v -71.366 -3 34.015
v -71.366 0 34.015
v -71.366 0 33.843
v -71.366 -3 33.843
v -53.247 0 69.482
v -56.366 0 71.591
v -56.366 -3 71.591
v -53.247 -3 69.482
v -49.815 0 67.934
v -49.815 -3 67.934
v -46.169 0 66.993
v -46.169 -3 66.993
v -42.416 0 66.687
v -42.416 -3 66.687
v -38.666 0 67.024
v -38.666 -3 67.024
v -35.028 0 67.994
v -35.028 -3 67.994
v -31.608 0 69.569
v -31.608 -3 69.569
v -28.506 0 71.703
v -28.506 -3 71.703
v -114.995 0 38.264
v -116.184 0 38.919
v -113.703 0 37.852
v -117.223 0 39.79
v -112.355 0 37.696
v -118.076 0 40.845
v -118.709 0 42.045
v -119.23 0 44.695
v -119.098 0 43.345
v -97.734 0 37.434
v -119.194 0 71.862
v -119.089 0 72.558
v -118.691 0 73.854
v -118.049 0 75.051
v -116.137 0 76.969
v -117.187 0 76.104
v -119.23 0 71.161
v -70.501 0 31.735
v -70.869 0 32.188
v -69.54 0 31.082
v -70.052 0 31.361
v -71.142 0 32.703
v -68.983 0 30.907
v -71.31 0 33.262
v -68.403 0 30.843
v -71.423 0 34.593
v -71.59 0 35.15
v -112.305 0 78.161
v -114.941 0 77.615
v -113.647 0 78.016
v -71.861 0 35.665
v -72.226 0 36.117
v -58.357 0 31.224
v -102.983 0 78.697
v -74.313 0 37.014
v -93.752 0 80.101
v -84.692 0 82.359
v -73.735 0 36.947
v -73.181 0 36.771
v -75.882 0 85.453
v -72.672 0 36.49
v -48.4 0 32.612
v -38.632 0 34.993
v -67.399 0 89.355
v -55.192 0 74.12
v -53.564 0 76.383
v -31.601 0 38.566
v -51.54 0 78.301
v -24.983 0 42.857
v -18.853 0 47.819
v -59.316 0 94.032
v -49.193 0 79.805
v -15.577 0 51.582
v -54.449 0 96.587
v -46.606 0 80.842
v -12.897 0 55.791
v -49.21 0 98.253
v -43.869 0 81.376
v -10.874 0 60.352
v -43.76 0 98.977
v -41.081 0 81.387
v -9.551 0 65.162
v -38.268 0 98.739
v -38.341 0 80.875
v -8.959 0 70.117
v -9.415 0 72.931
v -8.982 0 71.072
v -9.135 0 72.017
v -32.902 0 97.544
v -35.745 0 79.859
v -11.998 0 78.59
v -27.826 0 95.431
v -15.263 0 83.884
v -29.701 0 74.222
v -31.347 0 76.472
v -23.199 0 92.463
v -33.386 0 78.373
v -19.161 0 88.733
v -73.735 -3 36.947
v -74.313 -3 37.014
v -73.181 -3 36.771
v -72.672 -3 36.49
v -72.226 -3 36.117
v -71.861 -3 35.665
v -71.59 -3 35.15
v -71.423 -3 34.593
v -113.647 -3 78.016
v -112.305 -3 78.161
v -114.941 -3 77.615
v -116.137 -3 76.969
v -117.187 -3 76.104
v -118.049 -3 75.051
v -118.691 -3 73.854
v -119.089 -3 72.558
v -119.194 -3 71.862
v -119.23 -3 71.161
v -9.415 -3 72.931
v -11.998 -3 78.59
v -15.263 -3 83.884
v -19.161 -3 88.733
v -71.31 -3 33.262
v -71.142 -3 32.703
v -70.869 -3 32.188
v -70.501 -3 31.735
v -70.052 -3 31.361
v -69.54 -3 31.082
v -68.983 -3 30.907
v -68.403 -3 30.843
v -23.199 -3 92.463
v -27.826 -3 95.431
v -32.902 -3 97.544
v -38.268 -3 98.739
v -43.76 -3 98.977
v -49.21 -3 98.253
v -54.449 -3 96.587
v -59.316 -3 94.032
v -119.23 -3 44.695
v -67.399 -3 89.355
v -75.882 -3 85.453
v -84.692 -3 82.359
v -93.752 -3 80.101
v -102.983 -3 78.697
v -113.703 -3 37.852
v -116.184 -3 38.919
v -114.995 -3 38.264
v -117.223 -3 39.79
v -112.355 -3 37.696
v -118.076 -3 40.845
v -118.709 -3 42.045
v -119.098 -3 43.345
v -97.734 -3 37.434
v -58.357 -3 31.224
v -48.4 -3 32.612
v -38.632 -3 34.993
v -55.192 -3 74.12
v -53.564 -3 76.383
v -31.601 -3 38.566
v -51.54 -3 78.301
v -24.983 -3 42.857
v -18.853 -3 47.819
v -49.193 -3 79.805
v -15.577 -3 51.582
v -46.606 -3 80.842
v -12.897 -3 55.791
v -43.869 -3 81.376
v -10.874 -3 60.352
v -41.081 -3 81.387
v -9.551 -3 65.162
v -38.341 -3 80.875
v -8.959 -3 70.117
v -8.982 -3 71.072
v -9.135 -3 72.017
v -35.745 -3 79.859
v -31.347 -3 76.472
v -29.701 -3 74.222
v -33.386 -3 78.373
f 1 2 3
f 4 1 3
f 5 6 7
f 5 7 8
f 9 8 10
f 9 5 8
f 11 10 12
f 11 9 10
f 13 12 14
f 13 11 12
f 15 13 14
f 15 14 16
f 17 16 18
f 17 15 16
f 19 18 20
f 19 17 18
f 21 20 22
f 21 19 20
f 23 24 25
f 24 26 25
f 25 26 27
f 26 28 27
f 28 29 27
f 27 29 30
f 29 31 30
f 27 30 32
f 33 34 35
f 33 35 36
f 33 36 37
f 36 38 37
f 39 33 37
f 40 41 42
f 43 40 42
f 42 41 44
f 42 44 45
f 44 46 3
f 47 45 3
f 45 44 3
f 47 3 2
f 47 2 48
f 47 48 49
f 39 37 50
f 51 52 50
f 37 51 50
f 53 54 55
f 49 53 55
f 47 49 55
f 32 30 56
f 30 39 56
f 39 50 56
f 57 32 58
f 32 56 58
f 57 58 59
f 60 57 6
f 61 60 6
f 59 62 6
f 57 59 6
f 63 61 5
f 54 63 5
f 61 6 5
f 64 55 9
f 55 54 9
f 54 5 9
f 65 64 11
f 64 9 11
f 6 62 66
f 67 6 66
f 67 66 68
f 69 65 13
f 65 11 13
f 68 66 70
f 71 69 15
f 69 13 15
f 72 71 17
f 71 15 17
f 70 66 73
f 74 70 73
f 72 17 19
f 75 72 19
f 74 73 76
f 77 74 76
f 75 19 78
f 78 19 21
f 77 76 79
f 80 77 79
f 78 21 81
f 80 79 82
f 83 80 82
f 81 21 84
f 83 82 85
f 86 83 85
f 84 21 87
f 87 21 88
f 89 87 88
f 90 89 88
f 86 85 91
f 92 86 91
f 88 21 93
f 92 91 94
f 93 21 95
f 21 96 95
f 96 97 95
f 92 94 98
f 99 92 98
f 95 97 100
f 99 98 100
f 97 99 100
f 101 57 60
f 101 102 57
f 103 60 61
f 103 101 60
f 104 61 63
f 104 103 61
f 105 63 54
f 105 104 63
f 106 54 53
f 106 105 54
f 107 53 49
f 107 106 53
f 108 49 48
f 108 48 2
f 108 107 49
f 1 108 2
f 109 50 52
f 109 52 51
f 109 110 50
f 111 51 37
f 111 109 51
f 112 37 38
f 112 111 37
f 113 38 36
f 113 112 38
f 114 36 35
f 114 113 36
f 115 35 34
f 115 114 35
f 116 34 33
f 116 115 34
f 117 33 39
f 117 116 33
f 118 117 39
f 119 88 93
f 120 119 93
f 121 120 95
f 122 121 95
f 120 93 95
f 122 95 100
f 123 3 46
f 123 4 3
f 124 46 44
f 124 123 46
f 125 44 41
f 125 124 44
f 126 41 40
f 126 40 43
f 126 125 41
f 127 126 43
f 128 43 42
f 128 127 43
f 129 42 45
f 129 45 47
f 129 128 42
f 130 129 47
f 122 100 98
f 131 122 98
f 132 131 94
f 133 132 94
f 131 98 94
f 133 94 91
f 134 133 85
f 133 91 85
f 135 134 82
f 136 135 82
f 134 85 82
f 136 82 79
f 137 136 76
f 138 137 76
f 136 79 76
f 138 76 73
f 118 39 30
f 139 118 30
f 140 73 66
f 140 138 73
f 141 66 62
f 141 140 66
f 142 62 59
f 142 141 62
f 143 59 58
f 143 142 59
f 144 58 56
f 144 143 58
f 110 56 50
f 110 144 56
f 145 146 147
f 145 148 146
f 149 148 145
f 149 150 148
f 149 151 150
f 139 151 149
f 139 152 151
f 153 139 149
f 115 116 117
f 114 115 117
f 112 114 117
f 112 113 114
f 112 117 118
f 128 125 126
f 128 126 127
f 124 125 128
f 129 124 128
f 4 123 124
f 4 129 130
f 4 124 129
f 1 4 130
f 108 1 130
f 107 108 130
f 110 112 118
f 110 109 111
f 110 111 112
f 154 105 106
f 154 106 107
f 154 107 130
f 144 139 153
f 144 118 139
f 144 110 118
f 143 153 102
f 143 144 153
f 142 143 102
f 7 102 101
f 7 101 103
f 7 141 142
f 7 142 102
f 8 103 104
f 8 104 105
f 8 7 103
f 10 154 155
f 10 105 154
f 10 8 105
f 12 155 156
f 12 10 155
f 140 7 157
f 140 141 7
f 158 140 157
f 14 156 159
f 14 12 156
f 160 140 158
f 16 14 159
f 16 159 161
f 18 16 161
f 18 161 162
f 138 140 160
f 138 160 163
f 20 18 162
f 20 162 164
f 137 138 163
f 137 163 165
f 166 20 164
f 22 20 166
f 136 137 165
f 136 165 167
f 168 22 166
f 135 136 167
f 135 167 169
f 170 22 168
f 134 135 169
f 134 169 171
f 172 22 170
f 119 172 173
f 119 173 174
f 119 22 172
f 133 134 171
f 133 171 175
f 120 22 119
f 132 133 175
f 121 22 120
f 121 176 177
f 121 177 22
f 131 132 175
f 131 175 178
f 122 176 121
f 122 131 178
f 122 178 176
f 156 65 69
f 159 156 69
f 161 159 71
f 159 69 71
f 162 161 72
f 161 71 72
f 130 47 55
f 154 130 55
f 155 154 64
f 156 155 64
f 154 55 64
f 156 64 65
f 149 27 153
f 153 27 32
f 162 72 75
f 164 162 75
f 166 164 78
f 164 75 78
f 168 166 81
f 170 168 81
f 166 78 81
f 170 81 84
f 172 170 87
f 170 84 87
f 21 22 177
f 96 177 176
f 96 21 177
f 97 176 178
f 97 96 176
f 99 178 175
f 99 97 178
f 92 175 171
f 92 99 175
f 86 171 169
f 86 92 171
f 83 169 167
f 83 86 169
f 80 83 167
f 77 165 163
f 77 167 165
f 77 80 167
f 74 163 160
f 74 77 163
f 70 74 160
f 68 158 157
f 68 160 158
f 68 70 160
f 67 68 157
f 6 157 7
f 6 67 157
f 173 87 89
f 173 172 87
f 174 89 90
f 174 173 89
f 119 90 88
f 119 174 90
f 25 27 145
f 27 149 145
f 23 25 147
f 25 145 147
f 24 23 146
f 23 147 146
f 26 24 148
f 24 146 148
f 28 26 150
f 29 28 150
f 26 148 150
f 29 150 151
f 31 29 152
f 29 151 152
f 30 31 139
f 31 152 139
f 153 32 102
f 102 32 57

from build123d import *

# Parameters (mm, degrees)
F1_DEPTH = 3
F2_DEPTH = 25
F3_R     = 7
F4_R     = 100
F5_R     = 7
F6_R     = 3


# Not quite as in the source:
# - a feature names something its author has since deleted; it is built from what else it names


with BuildPart() as f1:
    # F0 (on Front) → F1 (new body)
    with BuildSketch(Plane.XZ):
        with BuildLine():
            Line((-28.5062876117, 71.7030383349), (-23.3711215756, 71.5975238881))
            ThreePointArc((-23.3711215756, 71.5975238881), (-24.6315082315, 75.5227380174), (-26.6928125912, 79.0930187933))
            ThreePointArc((-26.6928125912, 79.0930187933), (-46.4685424733, 86.625019162), (-61.3664115867, 71.5962461648))
            Line((-61.3664115867, 71.5962461648), (-56.3664115867, 71.5913571682))
            ThreePointArc((-56.3664115867, 71.5913571682), (-42.4756351566, 81.447422187), (-28.5062876117, 71.7030383349))
        make_face()
        with BuildLine():
            ThreePointArc((-61.3664115867, 71.5962461648), (-42.3681277411, 52.5998806027), (-23.3711215756, 71.5975238881))
            Line((-23.3711215756, 71.5975238881), (-28.5062876117, 71.7030383349))
            ThreePointArc((-28.5062876117, 71.7030383349), (-35.0280474509, 67.9936357913), (-42.4162418185, 66.6868830915))
            ThreePointArc((-42.4162418185, 66.6868830915), (-49.8149115034, 67.9342855664), (-56.3664115867, 71.5913571682))
            Line((-56.3664115867, 71.5913571682), (-61.3664115867, 71.5962461648))
        make_face()
        with BuildLine():
            ThreePointArc((-42.4162418185, 66.6868830915), (-35.0280474509, 67.9936357913), (-28.5062876117, 71.7030383349))
            ThreePointArc((-28.5062876117, 71.7030383349), (-42.4756351566, 81.447422187), (-56.3664115867, 71.5913571682))
            ThreePointArc((-56.3664115867, 71.5913571682), (-49.8149115034, 67.9342855664), (-42.4162418185, 66.6868830915))
        make_face()
        with BuildLine():
            Line((-20.8711215756, 71.5975236603), (-23.3711215756, 71.5975238881))
            ThreePointArc((-23.3711215756, 71.5975238881), (-42.3681277411, 52.5998806027), (-61.3664115867, 71.5962461648))
            Line((-61.3664115867, 71.5962461648), (-63.866411581, 71.5960777947))
            ThreePointArc((-63.866411581, 71.5960777947), (-63.6941147241, 68.8812286525), (-63.1803487139, 66.2098738354))
            ThreePointArc((-63.1803487139, 66.2098738354), (-48.9397473345, 51.1287456375), (-28.5819229469, 55.1029300277))
            ThreePointArc((-28.5819229469, 55.1029300277), (-22.8939959961, 62.4935676044), (-20.8711215756, 71.5975236602))
        make_face()
        with BuildLine():
            ThreePointArc((-26.6928125912, 79.0930187933), (-24.6315082315, 75.5227380174), (-23.3711215756, 71.5975238881))
            Line((-23.3711215756, 71.5975238881), (-20.8711215756, 71.5975236603))
            ThreePointArc((-20.8711215756, 71.5975236602), (-22.8939959961, 62.4935676044), (-28.5819229469, 55.1029300277))
            ThreePointArc((-28.5819229469, 55.1029300277), (-33.5715090435, 45.0303149316), (-38.6320985636, 34.9931849634))
            ThreePointArc((-38.6320985636, 34.9931849634), (-28.2353261857, 40.6242290748), (-18.8527258187, 47.819251244))
            ThreePointArc((-18.8527258187, 47.819251244), (-11.5073907557, 58.7139707043), (-8.9261215756, 71.5975225718))
            Line((-8.9261215756, 71.5975225718), (-11.6744206899, 71.5975225718))
            Line((-11.6744206899, 71.5975225718), (-11.6744206899, 74.0203762137))
            ThreePointArc((-11.6744206899, 74.0203762137), (-14.431706638, 81.8781100982), (-19.1607128583, 88.7325325952))
            ThreePointArc((-19.1607128583, 88.7325325952), (-48.5320541227, 98.3962580044), (-71.9061774941, 78.1548738354))
            Line((-71.9061774941, 78.1548738354), (-107.2845857728, 78.1548738354))
            Line((-107.2845857728, 78.1548738354), (-119.2295857724, 78.1548738354))
            Line((-119.2295857724, 78.1548738354), (-119.2295857724, 66.2098738355))
            Line((-119.2295857724, 66.2098738355), (-119.2295857724, 47.819251244))
            ThreePointArc((-119.2295857724, 47.819251244), (-113.3445755267, 44.456364285), (-107.2845857724, 41.4201036786))
            Line((-107.2845857724, 41.4201036786), (-107.2845857724, 66.2098738354))
            Line((-107.2845857724, 66.2098738354), (-68.5864427672, 66.2098738354))
            Line((-68.5864427672, 66.2098738354), (-63.1803487138, 66.2098738354))
            ThreePointArc((-63.1803487139, 66.2098738354), (-63.6941147241, 68.8812286525), (-63.866411581, 71.5960777947))
            Line((-63.866411581, 71.5960777947), (-61.3664115867, 71.5962461648))
            ThreePointArc((-61.3664115867, 71.5962461648), (-46.4685424733, 86.625019162), (-26.6928125912, 79.0930187933))
        make_face()
        with BuildLine():
            Line((-11.6744206899, 71.5975225718), (-8.9261215756, 71.5975225718))
            ThreePointArc((-8.9261215756, 71.5975225718), (-13.1797411051, 80.6808937542), (-19.1607128583, 88.7325325952))
            ThreePointArc((-19.1607128583, 88.7325325952), (-14.431706638, 81.8781100982), (-11.6744206899, 74.0203762137))
            Line((-11.6744206899, 74.0203762137), (-11.6744206899, 71.5975225718))
        make_face()
        with BuildLine():
            Line((-119.2295857724, 47.819251244), (-119.2295857724, 37.819251244))
            Line((-119.2295857724, 37.819251244), (-97.7339796794, 37.4339680289))
            ThreePointArc((-97.7339796794, 37.4339680289), (-102.5508909325, 39.3273444167), (-107.2845857724, 41.4201036786))
            ThreePointArc((-107.2845857724, 41.4201036786), (-113.3445755267, 44.456364285), (-119.2295857724, 47.819251244))
        make_face()
        with BuildLine():
            ThreePointArc((-38.6320985636, 34.9931849634), (-33.5715090435, 45.0303149316), (-28.5819229469, 55.1029300277))
            ThreePointArc((-28.5819229469, 55.1029300277), (-48.9397473345, 51.1287456375), (-63.1803487139, 66.2098738354))
            Line((-63.1803487138, 66.2098738354), (-68.5864427672, 66.2098738354))
            Line((-68.5864427672, 66.2098738354), (-107.2845857724, 66.2098738354))
            Line((-107.2845857724, 66.2098738354), (-107.2845857724, 41.4201036786))
            ThreePointArc((-107.2845857724, 41.4201036786), (-102.5508909325, 39.3273444167), (-97.7339796794, 37.4339680289))
            Line((-97.7339796794, 37.4339680289), (-71.3664115866, 36.9613606799))
            Line((-71.3664115866, 36.9613606799), (-71.3664115866, 30.923581687))
            ThreePointArc((-71.3664115866, 30.923581687), (-54.830296618, 31.5993469164), (-38.6320985636, 34.9931849634))
        make_face()
    extrude(amount=F1_DEPTH)

    # F0 (on Front) → F2 (cut)
    with BuildSketch(Plane.XZ):
        with BuildLine():
            ThreePointArc((-42.4162418185, 66.6868830915), (-35.0280474509, 67.9936357913), (-28.5062876117, 71.7030383349))
            ThreePointArc((-28.5062876117, 71.7030383349), (-42.4756351566, 81.447422187), (-56.3664115867, 71.5913571682))
            ThreePointArc((-56.3664115867, 71.5913571682), (-49.8149115034, 67.9342855664), (-42.4162418185, 66.6868830915))
        make_face()
    extrude(amount=F2_DEPTH, mode=Mode.SUBTRACT)

    # F3
    f3_edges = [f1.edges().sort_by_distance(p)[0] for p in [
        (-8.926122, -1.5, 71.597523),
        (-119.229586, -1.5, 37.819251),
    ]]
    fillet(f3_edges, radius=F3_R)

    # F4
    f4_edges = [f1.edges().sort_by_distance(p)[0] for p in [
        (-71.906177, -1.5, 78.154874),
    ]]
    fillet(f4_edges, radius=F4_R)

    # F5
    f5_edges = [f1.edges().sort_by_distance(p)[0] for p in [
        (-119.229586, -1.5, 78.154874),
    ]]
    fillet(f5_edges, radius=F5_R)

    # F6
    f6_edges = [f1.edges().sort_by_distance(p)[0] for p in [
        (-71.366412, -1.5, 36.961361),
        (-71.366412, -1.5, 30.923582),
    ]]
    fillet(f6_edges, radius=F6_R)


solid = f1.part
